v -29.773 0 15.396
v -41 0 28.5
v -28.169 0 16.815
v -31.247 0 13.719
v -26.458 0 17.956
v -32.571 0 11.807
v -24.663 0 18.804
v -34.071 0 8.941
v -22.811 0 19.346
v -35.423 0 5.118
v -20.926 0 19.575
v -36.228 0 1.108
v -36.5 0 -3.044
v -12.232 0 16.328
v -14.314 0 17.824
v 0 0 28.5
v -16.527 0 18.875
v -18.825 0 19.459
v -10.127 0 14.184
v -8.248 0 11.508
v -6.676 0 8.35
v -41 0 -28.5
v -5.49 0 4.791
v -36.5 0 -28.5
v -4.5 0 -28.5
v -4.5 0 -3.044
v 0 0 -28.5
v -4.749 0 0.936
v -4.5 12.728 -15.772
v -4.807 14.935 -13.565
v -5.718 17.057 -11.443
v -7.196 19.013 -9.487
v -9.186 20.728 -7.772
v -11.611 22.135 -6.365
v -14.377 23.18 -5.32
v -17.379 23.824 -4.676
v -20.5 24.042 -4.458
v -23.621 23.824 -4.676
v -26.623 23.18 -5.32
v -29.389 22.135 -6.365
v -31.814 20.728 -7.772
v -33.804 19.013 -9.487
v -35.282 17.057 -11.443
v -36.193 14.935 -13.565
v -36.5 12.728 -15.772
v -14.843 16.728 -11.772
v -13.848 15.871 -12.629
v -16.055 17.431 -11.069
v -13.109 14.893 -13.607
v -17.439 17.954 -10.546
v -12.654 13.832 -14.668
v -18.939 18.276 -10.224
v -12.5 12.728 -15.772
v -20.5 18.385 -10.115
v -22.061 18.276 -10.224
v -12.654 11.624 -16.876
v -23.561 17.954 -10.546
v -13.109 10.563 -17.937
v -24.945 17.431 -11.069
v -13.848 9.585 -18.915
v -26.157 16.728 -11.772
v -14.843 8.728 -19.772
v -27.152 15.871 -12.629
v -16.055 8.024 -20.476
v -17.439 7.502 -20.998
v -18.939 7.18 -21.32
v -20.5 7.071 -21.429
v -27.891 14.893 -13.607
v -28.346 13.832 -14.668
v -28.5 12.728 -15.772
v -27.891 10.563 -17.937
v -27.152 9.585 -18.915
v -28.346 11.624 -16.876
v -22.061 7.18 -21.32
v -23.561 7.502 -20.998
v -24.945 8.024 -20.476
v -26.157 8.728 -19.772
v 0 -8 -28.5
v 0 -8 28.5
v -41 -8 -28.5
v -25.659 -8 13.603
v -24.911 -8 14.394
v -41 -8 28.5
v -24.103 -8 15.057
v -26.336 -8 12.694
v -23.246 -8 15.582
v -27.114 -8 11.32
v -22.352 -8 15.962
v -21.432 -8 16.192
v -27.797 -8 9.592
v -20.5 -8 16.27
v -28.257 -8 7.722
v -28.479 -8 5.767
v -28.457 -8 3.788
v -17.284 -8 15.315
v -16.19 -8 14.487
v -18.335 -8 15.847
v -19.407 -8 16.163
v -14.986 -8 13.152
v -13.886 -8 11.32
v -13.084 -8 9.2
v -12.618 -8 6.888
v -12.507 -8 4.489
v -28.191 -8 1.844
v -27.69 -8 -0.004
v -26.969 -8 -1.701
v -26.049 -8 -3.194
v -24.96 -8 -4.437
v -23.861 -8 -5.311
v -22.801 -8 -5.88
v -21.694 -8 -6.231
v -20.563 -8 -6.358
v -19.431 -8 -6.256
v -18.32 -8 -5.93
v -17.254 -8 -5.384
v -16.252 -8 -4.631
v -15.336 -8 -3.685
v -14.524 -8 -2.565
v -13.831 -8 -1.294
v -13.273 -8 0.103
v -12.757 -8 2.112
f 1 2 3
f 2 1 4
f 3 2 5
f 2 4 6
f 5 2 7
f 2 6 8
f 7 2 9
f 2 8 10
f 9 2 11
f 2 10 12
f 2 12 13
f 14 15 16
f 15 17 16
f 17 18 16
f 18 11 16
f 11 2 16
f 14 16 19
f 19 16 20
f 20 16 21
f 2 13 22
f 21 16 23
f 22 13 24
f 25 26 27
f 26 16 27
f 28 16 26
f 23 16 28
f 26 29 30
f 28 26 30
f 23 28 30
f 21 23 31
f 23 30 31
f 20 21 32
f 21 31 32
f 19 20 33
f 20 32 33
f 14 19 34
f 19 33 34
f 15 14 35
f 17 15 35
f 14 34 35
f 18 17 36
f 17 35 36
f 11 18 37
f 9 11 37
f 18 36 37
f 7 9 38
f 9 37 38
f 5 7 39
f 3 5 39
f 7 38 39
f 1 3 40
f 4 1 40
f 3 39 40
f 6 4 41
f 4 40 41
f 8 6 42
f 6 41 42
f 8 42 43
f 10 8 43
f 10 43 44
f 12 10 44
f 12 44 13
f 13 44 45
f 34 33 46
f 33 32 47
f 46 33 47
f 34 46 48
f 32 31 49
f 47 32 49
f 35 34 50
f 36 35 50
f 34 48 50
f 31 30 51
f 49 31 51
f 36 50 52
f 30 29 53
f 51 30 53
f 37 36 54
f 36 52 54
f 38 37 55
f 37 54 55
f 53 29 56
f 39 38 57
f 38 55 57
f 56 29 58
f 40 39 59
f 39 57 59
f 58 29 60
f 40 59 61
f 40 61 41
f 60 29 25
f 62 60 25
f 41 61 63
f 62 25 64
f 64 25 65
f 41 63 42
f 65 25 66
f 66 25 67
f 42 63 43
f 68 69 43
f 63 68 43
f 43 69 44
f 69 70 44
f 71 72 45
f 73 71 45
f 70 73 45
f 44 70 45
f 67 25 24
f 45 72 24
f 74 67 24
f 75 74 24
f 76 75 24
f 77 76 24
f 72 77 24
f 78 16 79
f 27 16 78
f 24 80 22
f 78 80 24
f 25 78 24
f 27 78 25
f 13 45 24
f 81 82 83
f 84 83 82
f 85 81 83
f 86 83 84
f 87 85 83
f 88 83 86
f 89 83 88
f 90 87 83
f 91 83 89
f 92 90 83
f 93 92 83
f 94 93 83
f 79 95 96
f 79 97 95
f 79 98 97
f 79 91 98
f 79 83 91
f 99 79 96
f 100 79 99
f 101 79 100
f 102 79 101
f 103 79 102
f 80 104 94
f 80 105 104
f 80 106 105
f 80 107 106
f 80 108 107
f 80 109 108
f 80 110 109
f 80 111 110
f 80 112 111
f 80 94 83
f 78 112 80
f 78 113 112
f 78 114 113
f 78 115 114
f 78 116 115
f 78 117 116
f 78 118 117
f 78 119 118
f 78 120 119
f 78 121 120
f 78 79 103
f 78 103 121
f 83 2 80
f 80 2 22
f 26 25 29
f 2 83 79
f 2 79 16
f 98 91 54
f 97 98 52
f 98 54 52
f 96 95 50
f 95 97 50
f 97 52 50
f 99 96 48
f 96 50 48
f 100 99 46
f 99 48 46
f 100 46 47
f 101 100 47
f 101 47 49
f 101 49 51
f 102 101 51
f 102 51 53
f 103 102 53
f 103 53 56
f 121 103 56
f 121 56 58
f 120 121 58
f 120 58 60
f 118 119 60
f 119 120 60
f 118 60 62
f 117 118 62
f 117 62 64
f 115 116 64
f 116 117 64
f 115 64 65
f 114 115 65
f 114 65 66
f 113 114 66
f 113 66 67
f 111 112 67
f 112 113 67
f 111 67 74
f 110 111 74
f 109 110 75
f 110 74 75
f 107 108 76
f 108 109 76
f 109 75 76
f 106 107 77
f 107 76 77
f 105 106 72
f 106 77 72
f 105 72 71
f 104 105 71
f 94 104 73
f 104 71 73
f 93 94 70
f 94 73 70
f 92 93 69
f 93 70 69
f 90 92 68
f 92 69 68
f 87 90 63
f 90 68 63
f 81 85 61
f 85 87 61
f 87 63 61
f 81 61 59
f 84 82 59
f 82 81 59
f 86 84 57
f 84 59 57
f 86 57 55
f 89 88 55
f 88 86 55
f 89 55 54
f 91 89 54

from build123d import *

# Parameters (mm, degrees)
SKETCH_1_W          = 57
SKETCH_1_H          = 8
EXTRUDE_1_DEPTH     = 41
EXTRUDE_2_REACH     = 65.274
SKETCH_3_R          = 8
CUT_EXTRUDE_1_DEPTH = 41


with BuildPart() as part:
    # 草图1 → 凸台-拉伸1 (new body)
    with BuildSketch(Plane(origin=(0, 0, 0), x_dir=(0, 0, -1), z_dir=(1, 0, 0))):
        with Locations((0, -4)):
            Rectangle(SKETCH_1_W, SKETCH_1_H)
    extrude(amount=-EXTRUDE_1_DEPTH)

    # 草图2 → 凸台-拉伸2 (add, up to next)
    with BuildSketch(Plane(origin=(0, 14.25, -14.25), x_dir=(1, 0, 0), z_dir=(0, 0.7071067811865488, -0.7071067811865464)), mode=Mode.PRIVATE) as extrude_2_sk1:
        with BuildLine():
            Line((-36.5, 2.152543264), (-36.5, 20.152543264))
            Line((-36.5, 20.152543264), (-4.5, 20.152543264))
            Line((-4.5, 20.152543264), (-4.5, 2.152543264))
            ThreePointArc((-4.5, 2.152543264), (-20.5, -13.847456736), (-36.5, 2.152543264))
        make_face()
    extrude_2_tool1 = extrude(extrude_2_sk1.sketch, amount=-EXTRUDE_2_REACH, mode=Mode.PRIVATE) - part.part
    add(extrude_2_tool1.solids().sort_by_distance((-20.5, 10.954355, -17.545645))[0])

    # 草图3 → 切除-拉伸1 (cut)
    with BuildSketch(Plane(origin=(0, 14.25, -14.25), x_dir=(1, 0, 0), z_dir=(0, 0.7071067811865488, -0.7071067811865464))):
        with Locations(Location((-20.5, 2.152543264, 0), (0, 0, 270))):
            Circle(SKETCH_3_R)
    extrude(amount=-CUT_EXTRUDE_1_DEPTH, mode=Mode.SUBTRACT)


solid = part.part
